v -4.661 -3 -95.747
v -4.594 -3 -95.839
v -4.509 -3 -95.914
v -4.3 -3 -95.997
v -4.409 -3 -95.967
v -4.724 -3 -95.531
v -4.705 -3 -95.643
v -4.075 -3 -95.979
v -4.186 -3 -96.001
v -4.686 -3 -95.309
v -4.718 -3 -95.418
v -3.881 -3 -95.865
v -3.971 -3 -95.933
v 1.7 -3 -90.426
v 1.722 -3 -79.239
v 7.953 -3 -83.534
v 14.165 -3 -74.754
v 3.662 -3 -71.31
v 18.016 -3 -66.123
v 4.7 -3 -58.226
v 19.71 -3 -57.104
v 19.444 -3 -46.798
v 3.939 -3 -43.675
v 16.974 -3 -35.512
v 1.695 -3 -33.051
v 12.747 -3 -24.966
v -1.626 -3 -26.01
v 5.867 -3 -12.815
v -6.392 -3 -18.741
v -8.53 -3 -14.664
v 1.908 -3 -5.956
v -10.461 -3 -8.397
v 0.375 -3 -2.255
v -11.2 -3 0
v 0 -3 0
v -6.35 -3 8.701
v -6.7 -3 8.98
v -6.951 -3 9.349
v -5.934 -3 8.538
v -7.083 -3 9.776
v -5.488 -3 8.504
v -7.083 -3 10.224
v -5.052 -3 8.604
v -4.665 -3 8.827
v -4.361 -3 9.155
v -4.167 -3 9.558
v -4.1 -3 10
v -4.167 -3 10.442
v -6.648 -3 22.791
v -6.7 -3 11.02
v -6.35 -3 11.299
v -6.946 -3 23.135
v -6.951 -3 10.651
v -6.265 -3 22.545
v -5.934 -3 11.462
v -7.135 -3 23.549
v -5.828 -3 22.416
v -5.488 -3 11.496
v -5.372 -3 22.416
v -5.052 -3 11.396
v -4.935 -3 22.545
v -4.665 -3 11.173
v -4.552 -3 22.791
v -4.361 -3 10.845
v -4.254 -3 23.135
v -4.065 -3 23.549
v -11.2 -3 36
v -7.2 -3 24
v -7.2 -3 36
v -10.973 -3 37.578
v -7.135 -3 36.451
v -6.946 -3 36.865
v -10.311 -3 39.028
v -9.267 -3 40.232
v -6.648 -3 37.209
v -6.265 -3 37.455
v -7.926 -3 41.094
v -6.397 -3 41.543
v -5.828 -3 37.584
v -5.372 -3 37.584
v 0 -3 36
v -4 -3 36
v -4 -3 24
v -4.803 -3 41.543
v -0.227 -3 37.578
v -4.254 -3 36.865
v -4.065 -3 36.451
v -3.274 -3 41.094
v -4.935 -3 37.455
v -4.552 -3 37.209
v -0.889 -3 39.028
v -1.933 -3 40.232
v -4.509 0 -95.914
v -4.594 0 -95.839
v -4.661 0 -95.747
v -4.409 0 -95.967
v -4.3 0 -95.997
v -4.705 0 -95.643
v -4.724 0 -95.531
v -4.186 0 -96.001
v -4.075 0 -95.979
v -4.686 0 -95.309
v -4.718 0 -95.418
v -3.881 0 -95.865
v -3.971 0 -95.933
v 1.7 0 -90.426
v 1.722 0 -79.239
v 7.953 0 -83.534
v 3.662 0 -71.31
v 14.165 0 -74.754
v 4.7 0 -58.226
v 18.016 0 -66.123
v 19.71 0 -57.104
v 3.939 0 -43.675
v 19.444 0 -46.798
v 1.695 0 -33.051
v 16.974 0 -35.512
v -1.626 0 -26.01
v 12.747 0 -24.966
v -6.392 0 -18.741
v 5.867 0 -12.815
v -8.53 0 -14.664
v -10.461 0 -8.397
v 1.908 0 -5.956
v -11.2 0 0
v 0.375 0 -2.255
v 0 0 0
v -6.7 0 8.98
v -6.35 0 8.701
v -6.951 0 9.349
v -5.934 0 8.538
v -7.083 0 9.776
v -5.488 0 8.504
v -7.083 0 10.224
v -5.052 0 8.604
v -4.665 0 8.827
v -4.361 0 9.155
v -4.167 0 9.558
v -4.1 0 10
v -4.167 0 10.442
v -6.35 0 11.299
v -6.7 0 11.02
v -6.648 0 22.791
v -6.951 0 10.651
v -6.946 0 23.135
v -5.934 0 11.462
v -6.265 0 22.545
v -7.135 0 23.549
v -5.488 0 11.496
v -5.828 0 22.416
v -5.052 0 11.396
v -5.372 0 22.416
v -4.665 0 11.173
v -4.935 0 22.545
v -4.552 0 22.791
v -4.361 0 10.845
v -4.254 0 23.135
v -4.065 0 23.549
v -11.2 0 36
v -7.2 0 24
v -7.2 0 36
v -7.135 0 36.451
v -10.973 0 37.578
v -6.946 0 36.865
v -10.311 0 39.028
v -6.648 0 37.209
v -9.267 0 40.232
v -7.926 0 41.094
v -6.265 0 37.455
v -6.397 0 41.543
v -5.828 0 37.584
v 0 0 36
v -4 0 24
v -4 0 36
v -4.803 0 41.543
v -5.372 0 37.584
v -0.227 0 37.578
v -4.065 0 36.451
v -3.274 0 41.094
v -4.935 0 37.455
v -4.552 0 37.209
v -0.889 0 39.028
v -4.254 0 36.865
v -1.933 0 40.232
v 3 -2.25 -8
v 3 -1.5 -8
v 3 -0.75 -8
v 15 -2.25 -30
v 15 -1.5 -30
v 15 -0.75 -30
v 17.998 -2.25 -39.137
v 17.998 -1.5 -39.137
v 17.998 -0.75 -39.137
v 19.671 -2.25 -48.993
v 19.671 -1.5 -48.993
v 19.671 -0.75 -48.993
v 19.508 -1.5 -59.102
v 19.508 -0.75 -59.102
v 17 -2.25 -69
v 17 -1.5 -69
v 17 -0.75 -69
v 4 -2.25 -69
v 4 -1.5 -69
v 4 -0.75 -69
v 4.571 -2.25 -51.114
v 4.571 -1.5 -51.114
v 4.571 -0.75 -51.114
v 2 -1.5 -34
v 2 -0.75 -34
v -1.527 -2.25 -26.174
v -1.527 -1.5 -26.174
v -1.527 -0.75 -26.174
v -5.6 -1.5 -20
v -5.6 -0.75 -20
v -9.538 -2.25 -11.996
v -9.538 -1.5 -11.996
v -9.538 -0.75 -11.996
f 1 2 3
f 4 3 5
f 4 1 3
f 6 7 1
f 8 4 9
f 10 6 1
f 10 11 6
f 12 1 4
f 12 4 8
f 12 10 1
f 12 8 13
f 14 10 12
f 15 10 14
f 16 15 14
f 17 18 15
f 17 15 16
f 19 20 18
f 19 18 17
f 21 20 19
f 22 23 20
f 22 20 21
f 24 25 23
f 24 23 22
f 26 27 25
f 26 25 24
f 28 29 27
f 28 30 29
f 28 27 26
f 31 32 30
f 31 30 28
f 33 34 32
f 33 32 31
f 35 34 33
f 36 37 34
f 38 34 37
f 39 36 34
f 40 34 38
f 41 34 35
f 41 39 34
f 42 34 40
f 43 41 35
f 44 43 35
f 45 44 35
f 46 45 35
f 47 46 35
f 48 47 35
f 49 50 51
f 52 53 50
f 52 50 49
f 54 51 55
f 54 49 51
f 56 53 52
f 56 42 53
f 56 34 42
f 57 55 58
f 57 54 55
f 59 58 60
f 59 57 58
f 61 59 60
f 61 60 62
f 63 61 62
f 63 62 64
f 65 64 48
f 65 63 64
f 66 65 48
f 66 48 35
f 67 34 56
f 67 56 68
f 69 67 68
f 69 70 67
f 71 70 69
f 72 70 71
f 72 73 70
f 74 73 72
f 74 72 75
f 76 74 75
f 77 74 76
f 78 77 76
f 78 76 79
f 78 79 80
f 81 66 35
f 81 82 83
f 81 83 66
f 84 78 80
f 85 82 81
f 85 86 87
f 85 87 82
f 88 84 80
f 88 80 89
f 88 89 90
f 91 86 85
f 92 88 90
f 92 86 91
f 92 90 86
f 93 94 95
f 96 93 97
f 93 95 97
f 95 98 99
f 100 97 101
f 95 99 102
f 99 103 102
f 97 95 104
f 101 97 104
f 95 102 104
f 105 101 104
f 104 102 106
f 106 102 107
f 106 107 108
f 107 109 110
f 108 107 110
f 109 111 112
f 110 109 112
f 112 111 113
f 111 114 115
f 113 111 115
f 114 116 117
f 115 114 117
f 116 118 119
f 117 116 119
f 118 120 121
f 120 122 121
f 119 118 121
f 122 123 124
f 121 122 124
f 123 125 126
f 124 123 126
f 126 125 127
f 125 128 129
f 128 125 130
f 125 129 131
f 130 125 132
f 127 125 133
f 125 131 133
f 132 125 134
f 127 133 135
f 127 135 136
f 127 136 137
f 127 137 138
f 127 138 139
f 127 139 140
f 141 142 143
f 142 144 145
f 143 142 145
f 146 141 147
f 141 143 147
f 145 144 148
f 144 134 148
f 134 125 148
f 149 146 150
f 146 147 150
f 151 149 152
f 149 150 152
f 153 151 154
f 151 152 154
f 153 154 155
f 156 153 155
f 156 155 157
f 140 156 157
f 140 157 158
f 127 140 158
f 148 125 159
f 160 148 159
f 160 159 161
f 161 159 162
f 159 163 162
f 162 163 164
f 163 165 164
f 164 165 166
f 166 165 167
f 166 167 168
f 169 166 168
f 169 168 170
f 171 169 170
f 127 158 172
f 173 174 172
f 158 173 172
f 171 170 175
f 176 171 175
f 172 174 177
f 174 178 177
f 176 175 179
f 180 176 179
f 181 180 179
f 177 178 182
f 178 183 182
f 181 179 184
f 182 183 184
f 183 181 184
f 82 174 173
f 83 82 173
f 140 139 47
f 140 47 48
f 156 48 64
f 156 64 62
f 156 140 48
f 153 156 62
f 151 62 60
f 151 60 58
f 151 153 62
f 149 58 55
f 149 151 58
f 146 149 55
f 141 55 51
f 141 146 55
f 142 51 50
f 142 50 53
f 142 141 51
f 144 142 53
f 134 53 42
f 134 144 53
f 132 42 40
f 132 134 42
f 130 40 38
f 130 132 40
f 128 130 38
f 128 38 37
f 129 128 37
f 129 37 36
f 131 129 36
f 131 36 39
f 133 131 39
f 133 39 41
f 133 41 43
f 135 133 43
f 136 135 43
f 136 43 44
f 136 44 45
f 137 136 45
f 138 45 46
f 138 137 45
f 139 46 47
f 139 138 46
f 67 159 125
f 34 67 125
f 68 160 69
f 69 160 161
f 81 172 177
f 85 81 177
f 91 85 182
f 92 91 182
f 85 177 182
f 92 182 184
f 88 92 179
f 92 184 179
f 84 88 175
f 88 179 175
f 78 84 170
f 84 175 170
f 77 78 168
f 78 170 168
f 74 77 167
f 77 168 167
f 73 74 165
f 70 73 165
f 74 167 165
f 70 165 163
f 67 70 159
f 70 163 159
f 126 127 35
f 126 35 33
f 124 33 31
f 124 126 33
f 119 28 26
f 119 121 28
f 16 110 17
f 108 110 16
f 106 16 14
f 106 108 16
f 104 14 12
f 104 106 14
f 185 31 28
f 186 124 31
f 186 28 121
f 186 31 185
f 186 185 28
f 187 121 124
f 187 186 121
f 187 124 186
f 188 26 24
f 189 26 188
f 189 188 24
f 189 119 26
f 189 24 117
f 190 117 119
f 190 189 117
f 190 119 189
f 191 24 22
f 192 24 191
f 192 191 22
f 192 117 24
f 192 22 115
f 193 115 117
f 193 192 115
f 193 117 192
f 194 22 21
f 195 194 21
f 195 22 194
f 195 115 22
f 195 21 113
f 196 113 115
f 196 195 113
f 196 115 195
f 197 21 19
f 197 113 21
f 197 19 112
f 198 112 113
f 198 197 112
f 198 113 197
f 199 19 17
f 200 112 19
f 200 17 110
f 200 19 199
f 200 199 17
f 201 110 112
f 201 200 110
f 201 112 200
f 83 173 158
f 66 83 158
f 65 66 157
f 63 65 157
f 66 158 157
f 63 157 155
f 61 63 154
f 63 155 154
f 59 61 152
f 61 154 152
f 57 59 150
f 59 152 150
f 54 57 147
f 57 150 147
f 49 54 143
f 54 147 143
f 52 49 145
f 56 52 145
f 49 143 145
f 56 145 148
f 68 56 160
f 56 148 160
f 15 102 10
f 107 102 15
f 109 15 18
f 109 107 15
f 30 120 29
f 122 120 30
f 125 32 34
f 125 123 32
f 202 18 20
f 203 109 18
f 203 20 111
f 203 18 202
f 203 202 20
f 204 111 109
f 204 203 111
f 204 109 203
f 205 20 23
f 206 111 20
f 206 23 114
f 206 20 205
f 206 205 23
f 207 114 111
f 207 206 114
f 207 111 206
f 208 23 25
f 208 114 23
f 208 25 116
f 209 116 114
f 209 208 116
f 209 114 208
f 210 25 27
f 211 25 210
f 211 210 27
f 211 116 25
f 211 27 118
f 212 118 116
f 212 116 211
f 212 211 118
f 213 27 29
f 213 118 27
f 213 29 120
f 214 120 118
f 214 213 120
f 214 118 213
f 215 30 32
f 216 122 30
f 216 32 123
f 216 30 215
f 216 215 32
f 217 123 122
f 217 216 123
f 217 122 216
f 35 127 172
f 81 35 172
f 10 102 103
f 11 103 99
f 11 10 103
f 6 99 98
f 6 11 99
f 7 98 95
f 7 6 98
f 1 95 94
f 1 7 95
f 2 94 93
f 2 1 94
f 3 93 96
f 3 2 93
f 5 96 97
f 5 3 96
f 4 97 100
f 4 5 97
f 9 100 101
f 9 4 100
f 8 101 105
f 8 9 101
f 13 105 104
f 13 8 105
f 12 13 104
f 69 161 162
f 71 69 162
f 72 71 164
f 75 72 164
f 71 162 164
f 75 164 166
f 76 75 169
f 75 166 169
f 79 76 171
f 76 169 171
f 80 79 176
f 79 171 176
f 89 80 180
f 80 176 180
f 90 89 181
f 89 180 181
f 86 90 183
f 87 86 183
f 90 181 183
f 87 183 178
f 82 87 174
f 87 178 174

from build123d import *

# Parameters (mm, degrees)
F0_R     = 1.5
F1_DEPTH = 3
F2_R     = 0.5


with BuildPart() as f1:
    # F0 (on Front) → F1 (new body)
    with BuildSketch(Plane.XZ):
        with BuildLine():
            Line((0, 0), (0, 36))
            ThreePointArc((0, 36), (-5.6, 41.6), (-11.2, 36))
            Line((-11.2, 36), (-11.2, 0))
            Line((-11.2, 0), (0, 0))
        make_face()
        with Locations((-5.6, 10)):
            Circle(F0_R, mode=Mode.SUBTRACT)
        with BuildLine():
            ThreePointArc((-4, 24), (-5.6, 22.4), (-7.2, 24))
            Line((-7.2, 24), (-7.2, 36))
            ThreePointArc((-7.2, 36), (-5.6, 37.6), (-4, 36))
            Line((-4, 36), (-4, 24))
        make_face(mode=Mode.SUBTRACT)
        with BuildLine():
            add(Edge.make_bspline(
                [(0, 0), (0, -2), (3.1541045196, -9.4040558016), (17.6686951017, -29.7619249068), (24.5263545515, -70.2884872842), (0, -92.1286925129), (-5.6, -97.5)],
                knots=[0, 0, 0, 0, 0.1446382869, 0.3923476742, 0.7015694111, 1, 1, 1, 1], degree=3))
            Line((0, 0), (-11.2, 0))
            add(Edge.make_bspline(
                [(-5.6, -97.5), (0, -84.0113517398), (5.7610152741, -72.7768138304), (4.5449377173, -33.0457161168), (-6.3860474236, -19.9826587077), (-11.2, -10), (-11.2, 0)],
                knots=[0, 0, 0, 0, 0.2748368988, 0.5715738779, 0.7716012788, 1, 1, 1, 1], degree=3))
        make_face()
    extrude(amount=F1_DEPTH)

    # F2
    f2_edges = [f1.edges().sort_by_distance(p)[0] for p in [
        (-5.6, -1.5, -97.5),
    ]]
    fillet(f2_edges, radius=F2_R)


solid = f1.part
